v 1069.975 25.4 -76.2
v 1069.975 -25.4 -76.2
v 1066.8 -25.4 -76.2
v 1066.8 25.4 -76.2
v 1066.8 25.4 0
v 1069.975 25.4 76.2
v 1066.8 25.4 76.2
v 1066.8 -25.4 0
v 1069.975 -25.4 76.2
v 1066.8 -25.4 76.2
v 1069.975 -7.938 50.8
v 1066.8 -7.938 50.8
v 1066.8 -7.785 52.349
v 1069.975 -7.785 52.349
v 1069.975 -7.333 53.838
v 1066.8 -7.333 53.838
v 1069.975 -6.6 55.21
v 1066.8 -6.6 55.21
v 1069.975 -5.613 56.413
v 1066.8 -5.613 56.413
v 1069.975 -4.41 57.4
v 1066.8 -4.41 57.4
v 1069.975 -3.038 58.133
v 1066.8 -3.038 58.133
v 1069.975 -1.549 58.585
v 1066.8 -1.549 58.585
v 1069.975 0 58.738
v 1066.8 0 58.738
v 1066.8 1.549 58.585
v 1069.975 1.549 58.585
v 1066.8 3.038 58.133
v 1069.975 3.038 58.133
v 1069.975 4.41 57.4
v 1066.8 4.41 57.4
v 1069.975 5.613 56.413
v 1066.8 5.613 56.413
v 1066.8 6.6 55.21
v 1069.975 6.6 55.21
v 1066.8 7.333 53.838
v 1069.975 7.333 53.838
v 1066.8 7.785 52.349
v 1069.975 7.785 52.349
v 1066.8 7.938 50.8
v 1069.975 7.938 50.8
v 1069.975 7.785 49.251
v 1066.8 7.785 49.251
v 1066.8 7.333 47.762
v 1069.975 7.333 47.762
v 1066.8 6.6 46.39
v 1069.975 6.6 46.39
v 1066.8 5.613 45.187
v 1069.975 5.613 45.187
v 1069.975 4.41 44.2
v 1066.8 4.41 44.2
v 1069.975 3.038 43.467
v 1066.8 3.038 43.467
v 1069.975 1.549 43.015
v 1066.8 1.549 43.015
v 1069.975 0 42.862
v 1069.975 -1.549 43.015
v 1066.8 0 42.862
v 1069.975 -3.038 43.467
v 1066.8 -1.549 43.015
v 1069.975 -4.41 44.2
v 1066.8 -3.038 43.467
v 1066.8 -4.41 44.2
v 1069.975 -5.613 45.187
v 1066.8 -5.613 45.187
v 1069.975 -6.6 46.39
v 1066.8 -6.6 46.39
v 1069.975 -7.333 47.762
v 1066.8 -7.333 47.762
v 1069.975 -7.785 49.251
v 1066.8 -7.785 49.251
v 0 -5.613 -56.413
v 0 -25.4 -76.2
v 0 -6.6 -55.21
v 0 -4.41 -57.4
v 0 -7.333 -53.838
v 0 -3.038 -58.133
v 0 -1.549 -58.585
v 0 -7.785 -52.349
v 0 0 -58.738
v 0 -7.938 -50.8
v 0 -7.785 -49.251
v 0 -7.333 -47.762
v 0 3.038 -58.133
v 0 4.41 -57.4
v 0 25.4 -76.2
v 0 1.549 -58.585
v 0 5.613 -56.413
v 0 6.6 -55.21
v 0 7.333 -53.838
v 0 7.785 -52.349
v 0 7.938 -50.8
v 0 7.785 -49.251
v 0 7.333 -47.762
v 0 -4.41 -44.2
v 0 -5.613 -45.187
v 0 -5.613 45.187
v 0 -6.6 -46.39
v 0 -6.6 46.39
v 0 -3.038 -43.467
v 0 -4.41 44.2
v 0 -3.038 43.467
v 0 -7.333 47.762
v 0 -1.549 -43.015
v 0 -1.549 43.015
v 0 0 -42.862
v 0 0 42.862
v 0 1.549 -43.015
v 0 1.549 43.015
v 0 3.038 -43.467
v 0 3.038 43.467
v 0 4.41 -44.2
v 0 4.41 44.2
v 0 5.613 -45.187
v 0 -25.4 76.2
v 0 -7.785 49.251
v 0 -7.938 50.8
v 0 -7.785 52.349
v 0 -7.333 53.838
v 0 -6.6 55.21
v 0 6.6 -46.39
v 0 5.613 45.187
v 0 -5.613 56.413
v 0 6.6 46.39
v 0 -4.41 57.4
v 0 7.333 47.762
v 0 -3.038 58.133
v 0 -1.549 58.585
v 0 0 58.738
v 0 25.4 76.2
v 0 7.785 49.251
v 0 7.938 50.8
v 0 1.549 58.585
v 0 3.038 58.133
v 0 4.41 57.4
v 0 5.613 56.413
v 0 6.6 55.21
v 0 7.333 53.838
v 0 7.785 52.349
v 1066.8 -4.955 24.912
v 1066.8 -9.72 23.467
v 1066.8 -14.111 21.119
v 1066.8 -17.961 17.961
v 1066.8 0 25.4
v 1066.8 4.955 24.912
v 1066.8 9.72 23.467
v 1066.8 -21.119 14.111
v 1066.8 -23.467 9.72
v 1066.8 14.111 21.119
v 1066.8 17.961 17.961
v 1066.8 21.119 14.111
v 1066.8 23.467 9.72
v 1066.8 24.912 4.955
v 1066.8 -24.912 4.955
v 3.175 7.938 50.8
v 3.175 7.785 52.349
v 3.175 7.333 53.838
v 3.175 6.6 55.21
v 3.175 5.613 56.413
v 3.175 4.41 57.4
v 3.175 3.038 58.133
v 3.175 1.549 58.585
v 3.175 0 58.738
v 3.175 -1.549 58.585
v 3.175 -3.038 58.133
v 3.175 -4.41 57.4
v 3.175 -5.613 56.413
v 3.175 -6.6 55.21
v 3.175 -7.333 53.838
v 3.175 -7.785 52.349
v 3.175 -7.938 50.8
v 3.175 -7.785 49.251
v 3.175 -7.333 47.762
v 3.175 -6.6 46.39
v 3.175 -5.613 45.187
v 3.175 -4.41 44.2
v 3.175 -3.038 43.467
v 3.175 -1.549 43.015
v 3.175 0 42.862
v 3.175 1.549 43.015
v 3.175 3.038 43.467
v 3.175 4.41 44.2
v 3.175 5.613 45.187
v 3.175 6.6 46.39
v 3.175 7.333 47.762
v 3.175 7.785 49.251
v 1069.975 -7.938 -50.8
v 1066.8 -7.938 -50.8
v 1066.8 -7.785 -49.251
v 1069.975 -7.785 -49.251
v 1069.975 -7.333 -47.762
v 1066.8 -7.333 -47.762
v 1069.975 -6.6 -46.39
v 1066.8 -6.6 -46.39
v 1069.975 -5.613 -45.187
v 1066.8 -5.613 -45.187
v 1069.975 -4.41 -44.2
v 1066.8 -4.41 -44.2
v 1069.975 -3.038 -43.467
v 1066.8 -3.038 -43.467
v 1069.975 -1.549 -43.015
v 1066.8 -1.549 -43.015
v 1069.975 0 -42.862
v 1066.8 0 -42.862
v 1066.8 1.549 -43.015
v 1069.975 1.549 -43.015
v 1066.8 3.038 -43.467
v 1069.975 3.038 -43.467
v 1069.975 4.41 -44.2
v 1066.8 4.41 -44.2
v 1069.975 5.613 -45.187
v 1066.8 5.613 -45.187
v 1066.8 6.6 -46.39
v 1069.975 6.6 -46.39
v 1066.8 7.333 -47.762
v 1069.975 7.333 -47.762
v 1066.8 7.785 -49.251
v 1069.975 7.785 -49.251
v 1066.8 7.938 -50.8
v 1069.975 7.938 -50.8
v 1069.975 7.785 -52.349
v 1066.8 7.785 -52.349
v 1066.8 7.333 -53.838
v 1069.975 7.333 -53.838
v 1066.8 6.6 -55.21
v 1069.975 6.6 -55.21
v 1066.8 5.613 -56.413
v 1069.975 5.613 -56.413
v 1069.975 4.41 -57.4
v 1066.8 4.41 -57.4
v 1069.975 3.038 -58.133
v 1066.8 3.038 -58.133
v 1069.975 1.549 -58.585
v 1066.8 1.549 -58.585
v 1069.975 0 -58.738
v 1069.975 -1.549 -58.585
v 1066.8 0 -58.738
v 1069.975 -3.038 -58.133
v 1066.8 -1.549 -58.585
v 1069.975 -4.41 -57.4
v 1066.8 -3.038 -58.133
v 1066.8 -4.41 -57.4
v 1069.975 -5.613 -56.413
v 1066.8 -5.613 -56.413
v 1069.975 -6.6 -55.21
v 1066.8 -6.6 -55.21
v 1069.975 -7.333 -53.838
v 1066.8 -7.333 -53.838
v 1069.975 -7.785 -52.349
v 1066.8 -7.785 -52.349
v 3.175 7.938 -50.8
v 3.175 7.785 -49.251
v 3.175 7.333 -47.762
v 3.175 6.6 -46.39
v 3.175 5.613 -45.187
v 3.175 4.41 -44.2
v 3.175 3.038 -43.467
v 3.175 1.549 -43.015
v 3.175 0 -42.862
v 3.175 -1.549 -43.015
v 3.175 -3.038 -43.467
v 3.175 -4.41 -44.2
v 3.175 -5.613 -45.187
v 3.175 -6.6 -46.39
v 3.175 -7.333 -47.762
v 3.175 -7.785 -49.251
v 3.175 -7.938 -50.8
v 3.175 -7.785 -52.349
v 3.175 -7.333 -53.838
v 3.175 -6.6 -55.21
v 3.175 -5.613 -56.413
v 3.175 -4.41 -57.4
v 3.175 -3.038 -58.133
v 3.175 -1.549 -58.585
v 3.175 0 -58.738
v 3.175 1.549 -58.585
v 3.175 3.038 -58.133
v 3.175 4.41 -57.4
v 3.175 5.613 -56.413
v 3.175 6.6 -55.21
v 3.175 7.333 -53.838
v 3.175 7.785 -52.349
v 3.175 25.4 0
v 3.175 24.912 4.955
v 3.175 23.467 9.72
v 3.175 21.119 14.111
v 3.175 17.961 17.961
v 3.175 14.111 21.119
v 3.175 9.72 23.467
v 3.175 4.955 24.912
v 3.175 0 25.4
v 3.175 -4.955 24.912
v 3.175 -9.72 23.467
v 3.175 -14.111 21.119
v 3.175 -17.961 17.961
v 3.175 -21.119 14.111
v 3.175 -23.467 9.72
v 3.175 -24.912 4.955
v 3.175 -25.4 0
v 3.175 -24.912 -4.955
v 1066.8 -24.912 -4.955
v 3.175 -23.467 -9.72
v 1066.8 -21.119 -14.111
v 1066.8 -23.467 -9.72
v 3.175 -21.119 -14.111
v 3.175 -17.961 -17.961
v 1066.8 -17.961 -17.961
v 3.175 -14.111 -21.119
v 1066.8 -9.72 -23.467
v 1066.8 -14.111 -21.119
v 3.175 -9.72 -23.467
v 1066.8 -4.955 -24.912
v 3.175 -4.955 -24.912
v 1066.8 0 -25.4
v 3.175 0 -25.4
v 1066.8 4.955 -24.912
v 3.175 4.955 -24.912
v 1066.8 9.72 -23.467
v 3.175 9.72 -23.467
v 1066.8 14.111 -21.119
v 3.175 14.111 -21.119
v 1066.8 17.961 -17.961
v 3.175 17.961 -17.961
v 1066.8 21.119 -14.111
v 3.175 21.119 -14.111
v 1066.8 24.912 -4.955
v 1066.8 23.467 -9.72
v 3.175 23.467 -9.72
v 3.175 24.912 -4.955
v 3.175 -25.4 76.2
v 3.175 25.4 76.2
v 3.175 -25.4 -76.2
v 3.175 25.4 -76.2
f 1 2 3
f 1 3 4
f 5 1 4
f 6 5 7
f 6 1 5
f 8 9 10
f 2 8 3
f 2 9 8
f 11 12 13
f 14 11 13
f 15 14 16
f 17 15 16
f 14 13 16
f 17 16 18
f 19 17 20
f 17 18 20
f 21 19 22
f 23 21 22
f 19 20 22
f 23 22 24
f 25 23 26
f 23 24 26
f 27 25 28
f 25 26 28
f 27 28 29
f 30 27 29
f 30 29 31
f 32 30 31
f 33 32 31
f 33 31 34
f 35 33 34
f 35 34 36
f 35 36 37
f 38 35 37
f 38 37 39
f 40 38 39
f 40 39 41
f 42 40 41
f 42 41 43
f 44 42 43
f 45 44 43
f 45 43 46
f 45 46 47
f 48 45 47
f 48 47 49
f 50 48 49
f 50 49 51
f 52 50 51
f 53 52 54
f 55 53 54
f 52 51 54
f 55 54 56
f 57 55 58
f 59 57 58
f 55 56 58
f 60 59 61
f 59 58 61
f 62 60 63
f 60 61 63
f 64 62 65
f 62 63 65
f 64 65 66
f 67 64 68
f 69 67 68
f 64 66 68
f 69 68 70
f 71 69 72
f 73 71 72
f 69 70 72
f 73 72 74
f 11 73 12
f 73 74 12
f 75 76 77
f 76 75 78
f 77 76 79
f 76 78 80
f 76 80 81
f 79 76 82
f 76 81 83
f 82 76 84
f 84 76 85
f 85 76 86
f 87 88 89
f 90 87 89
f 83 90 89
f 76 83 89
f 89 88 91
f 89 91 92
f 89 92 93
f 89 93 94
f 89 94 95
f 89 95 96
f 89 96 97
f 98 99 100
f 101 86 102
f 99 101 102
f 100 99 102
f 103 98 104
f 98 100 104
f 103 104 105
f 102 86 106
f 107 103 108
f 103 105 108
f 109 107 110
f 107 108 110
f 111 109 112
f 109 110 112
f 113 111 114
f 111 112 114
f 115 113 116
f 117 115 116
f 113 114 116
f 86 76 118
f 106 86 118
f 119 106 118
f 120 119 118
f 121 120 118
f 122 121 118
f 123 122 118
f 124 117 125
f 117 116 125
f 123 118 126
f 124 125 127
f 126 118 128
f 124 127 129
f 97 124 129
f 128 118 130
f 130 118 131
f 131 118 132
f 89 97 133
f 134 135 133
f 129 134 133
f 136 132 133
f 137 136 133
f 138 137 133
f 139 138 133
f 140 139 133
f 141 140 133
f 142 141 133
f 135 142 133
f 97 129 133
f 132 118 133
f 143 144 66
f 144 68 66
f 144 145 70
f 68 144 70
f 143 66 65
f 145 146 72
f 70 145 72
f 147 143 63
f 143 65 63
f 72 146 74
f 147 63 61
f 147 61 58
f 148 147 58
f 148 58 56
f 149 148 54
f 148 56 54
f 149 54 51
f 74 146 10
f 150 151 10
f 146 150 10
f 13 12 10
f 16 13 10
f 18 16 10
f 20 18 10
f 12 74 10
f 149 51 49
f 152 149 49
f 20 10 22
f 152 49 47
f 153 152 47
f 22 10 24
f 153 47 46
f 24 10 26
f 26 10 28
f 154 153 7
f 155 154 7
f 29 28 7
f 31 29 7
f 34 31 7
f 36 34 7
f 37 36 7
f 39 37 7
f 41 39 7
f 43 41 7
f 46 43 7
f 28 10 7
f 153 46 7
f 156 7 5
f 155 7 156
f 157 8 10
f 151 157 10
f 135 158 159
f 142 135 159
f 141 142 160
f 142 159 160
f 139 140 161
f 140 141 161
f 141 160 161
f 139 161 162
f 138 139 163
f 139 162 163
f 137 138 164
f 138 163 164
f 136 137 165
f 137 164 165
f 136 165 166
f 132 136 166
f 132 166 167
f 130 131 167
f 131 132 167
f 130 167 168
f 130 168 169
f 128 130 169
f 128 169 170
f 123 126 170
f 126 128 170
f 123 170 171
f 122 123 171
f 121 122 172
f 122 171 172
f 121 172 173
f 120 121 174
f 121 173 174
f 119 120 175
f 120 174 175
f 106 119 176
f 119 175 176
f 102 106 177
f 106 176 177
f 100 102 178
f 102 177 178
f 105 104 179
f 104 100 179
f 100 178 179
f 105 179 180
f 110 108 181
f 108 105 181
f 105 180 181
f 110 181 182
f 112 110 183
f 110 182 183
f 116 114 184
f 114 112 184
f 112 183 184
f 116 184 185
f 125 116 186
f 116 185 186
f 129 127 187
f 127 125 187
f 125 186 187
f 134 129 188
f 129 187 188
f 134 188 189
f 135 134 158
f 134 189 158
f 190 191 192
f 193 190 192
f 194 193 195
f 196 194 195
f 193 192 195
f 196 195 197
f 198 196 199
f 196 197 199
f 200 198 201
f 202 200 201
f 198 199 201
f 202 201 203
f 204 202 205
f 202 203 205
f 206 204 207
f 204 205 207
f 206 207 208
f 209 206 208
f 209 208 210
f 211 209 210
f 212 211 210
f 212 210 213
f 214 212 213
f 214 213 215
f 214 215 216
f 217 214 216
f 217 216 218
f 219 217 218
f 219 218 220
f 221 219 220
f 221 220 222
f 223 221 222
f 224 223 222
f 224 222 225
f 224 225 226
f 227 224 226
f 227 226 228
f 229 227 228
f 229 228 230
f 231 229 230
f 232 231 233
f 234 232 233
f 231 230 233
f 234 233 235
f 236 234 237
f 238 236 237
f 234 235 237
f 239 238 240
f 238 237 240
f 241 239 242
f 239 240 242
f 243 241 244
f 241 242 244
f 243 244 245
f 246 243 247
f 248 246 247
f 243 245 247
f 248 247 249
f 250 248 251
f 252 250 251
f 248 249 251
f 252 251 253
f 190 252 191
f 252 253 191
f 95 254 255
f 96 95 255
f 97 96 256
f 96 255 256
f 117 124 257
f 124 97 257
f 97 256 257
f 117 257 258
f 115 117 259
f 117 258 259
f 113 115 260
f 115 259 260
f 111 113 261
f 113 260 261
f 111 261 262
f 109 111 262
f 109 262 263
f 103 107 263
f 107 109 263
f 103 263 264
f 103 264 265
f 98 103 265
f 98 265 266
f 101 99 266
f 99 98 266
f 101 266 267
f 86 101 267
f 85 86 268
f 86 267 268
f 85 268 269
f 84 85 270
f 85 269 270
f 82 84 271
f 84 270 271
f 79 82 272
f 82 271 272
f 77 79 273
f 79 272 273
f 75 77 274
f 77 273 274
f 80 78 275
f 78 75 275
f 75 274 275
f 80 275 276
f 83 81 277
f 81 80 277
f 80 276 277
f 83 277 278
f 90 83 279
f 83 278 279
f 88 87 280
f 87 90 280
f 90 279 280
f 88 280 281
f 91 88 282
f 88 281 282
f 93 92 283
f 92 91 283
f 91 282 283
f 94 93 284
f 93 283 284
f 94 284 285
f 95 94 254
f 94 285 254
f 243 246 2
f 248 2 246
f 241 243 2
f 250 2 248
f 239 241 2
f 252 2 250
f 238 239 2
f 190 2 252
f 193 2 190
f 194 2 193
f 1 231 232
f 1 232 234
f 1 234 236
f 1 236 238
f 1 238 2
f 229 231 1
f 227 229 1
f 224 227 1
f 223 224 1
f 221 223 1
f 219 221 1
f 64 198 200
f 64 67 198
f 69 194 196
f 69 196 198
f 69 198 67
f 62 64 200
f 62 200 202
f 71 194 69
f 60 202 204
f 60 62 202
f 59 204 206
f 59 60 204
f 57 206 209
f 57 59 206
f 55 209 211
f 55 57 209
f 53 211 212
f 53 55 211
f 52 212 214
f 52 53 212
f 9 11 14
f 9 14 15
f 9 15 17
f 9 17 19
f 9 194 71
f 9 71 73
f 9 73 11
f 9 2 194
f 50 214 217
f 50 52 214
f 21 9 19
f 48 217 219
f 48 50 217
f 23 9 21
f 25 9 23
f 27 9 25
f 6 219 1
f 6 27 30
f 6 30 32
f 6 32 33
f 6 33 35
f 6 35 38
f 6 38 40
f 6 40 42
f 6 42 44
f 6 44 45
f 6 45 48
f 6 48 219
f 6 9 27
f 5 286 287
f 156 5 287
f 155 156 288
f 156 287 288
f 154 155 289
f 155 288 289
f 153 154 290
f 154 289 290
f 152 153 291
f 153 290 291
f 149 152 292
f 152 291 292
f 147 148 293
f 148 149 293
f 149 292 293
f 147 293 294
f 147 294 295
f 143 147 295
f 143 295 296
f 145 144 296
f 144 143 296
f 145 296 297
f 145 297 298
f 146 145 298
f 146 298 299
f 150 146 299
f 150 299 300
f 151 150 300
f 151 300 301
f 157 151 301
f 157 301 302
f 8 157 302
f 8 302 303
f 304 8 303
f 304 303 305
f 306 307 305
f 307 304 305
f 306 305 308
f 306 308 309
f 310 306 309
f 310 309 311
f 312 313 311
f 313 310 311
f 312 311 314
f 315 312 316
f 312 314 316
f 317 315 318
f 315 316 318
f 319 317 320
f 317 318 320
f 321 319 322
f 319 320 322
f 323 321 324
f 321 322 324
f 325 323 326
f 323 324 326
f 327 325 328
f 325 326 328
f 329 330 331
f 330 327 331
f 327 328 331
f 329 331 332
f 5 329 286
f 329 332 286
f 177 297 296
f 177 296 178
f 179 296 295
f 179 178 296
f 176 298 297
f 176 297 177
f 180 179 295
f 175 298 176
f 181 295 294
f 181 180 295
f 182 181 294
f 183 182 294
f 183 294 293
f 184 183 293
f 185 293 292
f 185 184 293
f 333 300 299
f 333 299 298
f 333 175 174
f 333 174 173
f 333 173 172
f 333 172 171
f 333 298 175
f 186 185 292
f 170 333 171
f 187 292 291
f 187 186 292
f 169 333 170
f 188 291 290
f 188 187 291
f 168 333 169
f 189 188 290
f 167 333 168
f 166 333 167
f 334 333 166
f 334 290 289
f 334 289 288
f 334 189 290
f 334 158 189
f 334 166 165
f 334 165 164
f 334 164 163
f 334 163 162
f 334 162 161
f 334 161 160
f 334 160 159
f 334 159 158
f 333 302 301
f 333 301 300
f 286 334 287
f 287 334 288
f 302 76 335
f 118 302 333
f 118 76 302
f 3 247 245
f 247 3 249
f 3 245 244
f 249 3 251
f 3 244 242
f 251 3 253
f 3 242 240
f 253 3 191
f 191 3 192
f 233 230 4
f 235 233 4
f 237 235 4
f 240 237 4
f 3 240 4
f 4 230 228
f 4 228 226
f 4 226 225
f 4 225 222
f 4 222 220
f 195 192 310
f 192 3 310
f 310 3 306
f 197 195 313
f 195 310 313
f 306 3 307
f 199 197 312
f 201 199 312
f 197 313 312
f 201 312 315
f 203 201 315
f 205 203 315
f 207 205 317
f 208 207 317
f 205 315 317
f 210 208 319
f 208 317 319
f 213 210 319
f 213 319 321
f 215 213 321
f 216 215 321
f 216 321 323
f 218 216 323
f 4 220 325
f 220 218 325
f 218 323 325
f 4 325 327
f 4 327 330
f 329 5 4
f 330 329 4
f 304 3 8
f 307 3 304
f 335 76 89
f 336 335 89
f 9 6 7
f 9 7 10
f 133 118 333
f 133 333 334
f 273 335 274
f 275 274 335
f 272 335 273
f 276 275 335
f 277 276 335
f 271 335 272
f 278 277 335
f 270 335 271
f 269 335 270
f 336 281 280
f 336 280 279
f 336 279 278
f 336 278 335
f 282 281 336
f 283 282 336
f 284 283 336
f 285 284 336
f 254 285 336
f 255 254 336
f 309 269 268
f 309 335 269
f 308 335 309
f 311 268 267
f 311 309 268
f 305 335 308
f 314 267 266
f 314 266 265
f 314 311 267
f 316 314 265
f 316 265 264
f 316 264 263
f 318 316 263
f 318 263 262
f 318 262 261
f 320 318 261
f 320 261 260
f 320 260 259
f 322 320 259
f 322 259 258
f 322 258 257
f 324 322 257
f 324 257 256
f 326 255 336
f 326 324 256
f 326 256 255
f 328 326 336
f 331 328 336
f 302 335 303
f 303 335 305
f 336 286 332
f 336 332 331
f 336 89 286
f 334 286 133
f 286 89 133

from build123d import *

# Parameters (mm, degrees)
F0_R     = 25.4
F1_DEPTH = 1069.975
F2_W     = 50.8
F2_H     = 152.4
F3_DEPTH = 3.175
F5_D     = 15.875
F7_DEPTH = 3.175
F9_D     = 15.875


with BuildPart() as f1:
    # F0 (on Right) → F1 (new body)
    with BuildSketch(Plane.YZ):
        Circle(F0_R)
    extrude(amount=F1_DEPTH)

    # F2 (on Right) → F3 (join)
    with BuildSketch(Plane.YZ):
        Rectangle(F2_W, F2_H)
    extrude(amount=F3_DEPTH)

    # F5 (through all)
    with Locations(Plane(origin=(0, 0, 0), x_dir=(0, -1, 0), z_dir=(-1, 0, 0))):
        with Locations((0, 50.8), (0, -50.8)):
            Hole(F5_D / 2)

    # F6 (on face) → F7 (join)
    with BuildSketch(Plane.YZ.offset(1069.975)):
        Polygon((25.4, 0), (25.4, 76.2), (-25.4, 76.2), (-25.4, 0), (-25.4, -76.2), (25.4, -76.2), align=None)
    extrude(amount=-F7_DEPTH)

    # F9 (through all)
    with Locations(Plane.YZ.offset(1069.975)):
        with Locations((0, 50.8), (0, -50.8)):
            Hole(F9_D / 2)


solid = f1.part
